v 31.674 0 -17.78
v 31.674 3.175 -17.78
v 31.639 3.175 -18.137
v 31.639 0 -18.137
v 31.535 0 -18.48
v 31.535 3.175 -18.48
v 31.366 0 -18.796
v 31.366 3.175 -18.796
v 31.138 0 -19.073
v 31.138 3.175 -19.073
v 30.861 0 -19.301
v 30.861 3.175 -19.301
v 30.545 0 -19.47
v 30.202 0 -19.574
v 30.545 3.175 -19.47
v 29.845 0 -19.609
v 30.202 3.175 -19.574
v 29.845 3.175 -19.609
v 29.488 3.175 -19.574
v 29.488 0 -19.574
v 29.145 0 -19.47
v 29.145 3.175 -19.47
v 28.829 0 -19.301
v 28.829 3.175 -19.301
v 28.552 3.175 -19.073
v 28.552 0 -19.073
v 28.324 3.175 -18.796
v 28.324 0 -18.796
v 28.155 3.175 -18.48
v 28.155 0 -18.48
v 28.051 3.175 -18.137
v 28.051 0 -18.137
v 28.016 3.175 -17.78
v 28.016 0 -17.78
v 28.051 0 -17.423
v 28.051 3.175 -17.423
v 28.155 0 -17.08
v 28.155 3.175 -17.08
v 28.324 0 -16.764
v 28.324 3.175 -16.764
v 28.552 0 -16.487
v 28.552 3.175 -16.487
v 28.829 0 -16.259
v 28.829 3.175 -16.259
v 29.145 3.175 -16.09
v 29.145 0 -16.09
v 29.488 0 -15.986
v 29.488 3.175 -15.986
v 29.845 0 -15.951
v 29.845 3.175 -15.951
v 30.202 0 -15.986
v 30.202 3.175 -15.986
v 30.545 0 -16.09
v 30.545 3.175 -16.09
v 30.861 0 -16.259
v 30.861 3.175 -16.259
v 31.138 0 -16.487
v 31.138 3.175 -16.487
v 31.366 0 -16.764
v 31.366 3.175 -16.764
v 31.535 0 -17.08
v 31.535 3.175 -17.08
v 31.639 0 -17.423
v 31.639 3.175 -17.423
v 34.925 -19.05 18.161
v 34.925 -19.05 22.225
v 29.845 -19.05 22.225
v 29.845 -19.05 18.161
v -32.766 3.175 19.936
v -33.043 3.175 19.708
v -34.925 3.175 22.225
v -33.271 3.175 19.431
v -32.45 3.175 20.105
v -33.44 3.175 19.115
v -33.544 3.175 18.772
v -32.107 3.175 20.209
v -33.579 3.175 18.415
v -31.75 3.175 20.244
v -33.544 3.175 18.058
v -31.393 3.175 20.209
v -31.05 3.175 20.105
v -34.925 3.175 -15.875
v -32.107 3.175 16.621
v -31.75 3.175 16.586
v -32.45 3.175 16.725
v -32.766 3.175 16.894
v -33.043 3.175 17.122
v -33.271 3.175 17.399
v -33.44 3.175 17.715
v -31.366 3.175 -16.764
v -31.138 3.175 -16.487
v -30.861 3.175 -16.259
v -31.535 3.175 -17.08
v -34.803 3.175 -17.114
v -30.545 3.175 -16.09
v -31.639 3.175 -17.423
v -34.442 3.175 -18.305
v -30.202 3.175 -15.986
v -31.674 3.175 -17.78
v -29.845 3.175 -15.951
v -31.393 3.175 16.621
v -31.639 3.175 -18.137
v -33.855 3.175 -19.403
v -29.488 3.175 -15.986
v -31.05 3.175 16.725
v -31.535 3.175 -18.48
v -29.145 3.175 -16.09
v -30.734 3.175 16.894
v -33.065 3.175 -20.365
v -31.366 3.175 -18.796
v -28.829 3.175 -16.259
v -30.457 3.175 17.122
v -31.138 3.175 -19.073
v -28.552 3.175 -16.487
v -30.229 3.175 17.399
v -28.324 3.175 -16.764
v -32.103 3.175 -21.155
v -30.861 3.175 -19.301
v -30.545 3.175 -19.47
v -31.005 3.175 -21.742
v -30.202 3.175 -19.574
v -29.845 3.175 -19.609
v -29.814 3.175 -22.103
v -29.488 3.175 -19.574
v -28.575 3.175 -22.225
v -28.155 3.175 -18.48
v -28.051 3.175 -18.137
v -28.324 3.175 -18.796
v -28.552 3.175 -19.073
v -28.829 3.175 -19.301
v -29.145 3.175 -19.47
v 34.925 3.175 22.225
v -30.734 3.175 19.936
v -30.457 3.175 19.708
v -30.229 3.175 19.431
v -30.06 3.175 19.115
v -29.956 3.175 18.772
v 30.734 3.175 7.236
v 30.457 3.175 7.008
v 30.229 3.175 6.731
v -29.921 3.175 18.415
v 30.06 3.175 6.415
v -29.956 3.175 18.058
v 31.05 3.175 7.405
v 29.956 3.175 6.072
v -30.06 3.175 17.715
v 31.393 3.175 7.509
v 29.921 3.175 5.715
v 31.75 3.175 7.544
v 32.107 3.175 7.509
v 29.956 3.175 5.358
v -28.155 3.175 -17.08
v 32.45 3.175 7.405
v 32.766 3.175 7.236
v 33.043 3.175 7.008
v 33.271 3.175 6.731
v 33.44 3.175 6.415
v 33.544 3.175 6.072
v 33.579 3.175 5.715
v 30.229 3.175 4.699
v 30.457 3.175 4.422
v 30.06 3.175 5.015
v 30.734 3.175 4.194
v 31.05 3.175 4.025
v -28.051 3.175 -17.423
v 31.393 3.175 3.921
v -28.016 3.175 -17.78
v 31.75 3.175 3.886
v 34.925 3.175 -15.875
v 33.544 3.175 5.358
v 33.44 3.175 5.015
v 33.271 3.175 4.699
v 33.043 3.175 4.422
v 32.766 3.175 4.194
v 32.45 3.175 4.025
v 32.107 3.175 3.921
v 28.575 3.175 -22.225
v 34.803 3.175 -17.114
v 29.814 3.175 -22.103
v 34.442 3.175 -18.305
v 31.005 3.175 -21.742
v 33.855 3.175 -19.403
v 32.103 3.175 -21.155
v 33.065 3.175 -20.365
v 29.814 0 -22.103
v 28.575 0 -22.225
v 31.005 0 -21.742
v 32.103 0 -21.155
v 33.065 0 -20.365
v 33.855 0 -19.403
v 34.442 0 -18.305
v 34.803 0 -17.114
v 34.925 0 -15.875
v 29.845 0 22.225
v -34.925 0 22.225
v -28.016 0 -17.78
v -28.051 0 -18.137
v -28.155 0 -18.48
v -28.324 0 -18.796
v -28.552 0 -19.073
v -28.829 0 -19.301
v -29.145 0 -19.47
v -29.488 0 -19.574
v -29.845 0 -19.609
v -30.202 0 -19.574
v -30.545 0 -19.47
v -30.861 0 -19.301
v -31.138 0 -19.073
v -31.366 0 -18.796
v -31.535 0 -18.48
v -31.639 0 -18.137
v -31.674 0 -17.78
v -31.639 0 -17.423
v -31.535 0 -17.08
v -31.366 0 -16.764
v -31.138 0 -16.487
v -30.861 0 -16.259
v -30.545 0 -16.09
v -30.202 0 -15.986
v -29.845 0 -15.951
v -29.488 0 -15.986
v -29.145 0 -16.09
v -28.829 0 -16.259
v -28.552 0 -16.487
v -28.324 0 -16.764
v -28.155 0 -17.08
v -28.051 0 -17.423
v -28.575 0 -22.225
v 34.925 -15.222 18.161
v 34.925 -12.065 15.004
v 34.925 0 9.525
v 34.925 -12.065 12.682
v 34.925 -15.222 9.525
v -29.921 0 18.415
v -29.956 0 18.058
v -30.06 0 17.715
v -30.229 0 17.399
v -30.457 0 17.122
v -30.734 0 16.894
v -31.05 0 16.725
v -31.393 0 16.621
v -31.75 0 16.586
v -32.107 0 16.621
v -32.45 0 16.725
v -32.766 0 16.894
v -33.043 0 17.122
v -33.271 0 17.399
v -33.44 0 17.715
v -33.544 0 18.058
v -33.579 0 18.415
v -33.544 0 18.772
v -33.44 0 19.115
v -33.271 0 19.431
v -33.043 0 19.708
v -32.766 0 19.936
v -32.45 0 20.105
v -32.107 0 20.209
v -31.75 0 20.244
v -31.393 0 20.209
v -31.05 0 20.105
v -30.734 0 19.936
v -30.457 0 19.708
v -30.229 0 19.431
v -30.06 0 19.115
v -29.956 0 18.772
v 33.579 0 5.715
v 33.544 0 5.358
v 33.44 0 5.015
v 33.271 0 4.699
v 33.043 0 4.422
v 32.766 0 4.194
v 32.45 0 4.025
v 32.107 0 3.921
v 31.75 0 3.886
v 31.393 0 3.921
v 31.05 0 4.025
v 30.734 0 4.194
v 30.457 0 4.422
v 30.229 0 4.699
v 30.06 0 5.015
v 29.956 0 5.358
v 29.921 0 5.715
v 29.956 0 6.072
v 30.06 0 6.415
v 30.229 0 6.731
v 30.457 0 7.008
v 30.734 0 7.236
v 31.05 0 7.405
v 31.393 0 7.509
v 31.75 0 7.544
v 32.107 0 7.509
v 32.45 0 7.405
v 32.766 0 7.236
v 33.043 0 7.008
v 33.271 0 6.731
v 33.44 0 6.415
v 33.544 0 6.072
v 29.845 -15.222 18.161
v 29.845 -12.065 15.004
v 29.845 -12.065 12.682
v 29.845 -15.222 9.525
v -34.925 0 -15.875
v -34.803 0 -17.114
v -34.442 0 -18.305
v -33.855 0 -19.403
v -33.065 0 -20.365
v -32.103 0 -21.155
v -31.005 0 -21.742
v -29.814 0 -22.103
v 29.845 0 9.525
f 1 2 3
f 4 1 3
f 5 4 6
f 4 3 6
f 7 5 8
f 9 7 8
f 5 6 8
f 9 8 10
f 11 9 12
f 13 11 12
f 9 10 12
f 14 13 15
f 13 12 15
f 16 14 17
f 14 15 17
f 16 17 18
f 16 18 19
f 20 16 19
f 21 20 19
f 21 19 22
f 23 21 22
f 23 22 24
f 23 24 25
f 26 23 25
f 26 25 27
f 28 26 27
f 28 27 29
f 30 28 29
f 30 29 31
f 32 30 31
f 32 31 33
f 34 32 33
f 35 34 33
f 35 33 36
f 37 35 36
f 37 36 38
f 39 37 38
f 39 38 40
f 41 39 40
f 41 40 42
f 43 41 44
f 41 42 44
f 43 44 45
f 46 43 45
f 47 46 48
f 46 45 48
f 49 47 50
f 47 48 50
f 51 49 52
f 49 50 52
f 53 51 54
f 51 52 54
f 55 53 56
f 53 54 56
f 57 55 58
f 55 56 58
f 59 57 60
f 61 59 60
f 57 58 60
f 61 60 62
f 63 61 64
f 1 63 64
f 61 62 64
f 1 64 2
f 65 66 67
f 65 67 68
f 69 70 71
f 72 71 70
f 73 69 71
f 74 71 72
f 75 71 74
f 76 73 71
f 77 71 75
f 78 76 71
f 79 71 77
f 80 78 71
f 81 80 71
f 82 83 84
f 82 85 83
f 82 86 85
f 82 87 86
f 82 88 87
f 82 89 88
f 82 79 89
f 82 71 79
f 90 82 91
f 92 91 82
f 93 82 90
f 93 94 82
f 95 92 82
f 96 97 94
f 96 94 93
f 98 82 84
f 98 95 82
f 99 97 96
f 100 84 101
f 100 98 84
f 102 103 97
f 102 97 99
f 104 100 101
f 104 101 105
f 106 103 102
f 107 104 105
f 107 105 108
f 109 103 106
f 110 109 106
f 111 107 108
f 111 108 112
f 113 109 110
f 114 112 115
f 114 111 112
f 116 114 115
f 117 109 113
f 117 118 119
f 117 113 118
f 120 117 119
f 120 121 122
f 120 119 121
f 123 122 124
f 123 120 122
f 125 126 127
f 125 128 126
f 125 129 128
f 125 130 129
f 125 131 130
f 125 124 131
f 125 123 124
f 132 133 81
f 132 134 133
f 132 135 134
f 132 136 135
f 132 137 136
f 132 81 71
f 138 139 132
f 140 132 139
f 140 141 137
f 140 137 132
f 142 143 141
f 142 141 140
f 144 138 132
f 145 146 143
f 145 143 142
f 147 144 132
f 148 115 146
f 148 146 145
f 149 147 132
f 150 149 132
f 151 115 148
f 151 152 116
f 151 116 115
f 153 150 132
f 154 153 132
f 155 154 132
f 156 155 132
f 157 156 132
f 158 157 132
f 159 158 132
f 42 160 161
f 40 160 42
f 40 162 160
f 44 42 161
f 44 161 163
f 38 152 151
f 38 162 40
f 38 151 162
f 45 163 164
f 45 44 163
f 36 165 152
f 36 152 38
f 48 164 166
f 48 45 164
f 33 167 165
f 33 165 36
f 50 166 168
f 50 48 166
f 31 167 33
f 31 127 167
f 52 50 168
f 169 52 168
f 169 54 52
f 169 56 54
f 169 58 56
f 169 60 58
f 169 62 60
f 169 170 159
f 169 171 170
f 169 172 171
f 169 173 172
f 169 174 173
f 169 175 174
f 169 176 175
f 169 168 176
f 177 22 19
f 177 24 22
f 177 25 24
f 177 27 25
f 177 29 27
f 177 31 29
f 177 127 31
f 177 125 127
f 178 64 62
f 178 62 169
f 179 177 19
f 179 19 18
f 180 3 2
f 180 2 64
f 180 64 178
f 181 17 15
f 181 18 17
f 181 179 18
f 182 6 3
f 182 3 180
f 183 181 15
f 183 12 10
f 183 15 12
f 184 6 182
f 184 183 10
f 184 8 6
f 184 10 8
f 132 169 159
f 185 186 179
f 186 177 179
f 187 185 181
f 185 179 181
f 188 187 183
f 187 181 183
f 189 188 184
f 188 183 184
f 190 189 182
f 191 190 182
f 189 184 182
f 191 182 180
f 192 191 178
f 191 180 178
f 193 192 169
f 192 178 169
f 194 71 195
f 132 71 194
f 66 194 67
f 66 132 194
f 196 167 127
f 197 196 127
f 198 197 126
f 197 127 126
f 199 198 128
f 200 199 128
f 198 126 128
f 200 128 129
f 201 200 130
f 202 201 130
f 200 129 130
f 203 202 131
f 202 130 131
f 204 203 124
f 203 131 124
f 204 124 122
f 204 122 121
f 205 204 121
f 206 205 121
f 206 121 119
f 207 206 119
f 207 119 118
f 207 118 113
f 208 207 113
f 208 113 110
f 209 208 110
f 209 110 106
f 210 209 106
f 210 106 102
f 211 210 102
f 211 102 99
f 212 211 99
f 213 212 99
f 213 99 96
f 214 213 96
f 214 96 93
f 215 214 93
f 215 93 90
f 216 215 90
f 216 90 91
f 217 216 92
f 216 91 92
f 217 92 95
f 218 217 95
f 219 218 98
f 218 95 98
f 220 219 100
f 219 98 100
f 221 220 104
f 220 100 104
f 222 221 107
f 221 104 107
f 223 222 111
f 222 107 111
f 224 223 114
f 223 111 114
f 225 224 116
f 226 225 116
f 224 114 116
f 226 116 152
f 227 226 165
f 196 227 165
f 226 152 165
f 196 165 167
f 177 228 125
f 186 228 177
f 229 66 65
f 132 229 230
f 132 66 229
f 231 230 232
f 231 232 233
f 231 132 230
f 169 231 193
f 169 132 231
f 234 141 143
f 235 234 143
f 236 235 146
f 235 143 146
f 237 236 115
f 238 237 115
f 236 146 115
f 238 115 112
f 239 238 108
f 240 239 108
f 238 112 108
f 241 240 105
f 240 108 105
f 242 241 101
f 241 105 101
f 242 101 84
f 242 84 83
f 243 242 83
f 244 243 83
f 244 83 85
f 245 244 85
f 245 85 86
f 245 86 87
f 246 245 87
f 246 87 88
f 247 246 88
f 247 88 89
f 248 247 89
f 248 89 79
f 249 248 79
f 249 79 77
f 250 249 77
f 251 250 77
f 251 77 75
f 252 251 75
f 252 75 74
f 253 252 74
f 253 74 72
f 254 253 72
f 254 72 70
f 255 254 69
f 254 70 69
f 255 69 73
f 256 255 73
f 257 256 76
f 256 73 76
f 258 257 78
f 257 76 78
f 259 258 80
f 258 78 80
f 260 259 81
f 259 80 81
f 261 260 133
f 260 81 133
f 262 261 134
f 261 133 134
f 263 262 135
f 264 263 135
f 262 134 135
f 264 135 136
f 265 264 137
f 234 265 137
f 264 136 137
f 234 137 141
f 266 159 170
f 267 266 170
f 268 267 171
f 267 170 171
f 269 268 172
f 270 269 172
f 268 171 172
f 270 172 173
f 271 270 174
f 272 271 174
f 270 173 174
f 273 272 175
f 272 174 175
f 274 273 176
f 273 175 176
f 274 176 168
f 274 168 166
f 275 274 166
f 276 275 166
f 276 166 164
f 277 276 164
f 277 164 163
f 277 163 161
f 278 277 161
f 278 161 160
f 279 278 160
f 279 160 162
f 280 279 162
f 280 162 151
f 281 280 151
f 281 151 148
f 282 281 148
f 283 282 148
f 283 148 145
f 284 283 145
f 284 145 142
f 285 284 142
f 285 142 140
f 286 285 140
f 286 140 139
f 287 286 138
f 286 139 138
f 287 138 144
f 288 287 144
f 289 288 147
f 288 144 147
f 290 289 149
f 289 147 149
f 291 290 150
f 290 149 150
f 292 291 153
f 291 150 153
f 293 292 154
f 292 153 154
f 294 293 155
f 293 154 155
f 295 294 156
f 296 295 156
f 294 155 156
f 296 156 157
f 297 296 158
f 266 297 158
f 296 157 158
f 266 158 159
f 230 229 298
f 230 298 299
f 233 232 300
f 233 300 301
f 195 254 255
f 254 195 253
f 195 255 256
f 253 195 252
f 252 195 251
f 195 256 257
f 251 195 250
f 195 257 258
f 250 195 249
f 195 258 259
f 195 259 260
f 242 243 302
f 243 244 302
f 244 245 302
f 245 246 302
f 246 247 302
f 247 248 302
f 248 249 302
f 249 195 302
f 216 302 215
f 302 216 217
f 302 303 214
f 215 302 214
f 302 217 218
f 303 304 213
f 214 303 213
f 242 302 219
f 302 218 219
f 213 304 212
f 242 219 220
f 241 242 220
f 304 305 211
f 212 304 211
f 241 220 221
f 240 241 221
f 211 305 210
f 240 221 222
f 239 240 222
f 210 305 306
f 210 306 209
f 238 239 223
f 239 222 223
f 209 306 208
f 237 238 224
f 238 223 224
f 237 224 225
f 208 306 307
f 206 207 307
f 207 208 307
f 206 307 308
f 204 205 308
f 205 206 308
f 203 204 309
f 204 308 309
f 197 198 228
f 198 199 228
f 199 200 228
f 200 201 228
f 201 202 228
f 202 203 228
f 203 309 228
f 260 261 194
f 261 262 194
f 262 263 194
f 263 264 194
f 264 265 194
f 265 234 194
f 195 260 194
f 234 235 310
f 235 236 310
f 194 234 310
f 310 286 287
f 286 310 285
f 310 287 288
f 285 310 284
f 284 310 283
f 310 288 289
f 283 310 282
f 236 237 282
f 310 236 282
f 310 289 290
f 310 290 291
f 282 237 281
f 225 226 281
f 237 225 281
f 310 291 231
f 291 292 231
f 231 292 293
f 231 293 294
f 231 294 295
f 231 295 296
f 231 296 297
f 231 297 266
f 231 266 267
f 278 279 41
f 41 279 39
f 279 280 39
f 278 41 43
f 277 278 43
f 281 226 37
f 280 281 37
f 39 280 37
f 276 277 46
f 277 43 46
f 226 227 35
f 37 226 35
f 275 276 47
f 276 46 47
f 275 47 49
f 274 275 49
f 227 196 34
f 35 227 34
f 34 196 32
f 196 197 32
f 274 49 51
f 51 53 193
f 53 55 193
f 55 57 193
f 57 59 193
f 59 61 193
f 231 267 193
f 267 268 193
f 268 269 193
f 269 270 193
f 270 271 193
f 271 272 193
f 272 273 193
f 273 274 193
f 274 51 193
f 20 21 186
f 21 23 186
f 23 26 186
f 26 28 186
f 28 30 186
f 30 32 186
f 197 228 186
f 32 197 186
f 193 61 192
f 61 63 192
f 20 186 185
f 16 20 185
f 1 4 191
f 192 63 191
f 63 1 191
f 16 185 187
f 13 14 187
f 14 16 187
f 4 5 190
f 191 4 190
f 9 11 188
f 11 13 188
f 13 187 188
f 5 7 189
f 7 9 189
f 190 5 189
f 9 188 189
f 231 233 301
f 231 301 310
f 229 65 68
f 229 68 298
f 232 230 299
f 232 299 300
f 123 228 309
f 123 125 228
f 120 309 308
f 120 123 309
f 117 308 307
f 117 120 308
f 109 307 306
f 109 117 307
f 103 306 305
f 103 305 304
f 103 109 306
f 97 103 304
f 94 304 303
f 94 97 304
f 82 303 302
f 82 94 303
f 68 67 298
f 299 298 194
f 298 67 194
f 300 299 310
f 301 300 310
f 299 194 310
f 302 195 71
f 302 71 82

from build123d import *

# Parameters (mm, degrees)
SKETCH1_W                      = 69.85
SKETCH1_H                      = 44.45
BOSS_EXTRUDE1_DEPTH            = 3.175
BOSS_EXTRUDE2_DEPTH            = 5.08
FILLET1_R                      = 6.35
F_6_0_204_DIAMETER_HOLE1_D     = 3.6576
F_6_0_204_DIAMETER_HOLE1_DEPTH = 38.1
F_6_0_204_DIAMETER_HOLE1_TIP   = 1.0988539


with BuildPart() as part:
    # Sketch1 → Boss-Extrude1 (new body)
    with BuildSketch(Plane(origin=(0, 0, 0), x_dir=(1, 0, 0), z_dir=(0, 1, 0))):
        Rectangle(SKETCH1_W, SKETCH1_H)
    extrude(amount=BOSS_EXTRUDE1_DEPTH)

    # Sketch2 → Boss-Extrude2 (add)
    with BuildSketch(Plane(origin=(34.925, 0, 0), x_dir=(0, 0, -1), z_dir=(1, 0, 0))):
        Polygon((-22.225, 0), (-22.225, -19.05), (-18.161, -19.05), (-18.161, -15.2219533), (-15.0040594, -12.065), (-12.681966, -12.065), (-9.525, -15.2219533), (-9.525, 0), align=None)
    extrude(amount=-BOSS_EXTRUDE2_DEPTH)

    # Fillet1
    fillet1_edges = [part.edges().sort_by_distance(p)[0] for p in [
        (-34.925, 1.5875, -22.225),
        (34.925, 1.5875, -22.225),
    ]]
    fillet(fillet1_edges, radius=FILLET1_R)

    # #6 (0.204) Diameter Hole1
    with Locations(Plane(origin=(0, 0, 0), x_dir=(-1, 0, 0), z_dir=(0, -1, 0))):
        with Locations((-29.845, 17.78), (29.845, 17.78), (31.75, -18.415), (-31.75, -5.715)):
            Hole(F_6_0_204_DIAMETER_HOLE1_D / 2, depth=F_6_0_204_DIAMETER_HOLE1_DEPTH)
            with Locations((0, 0, -(F_6_0_204_DIAMETER_HOLE1_DEPTH + F_6_0_204_DIAMETER_HOLE1_TIP / 2))):  # 118° drill point
                Cone(0, F_6_0_204_DIAMETER_HOLE1_D / 2, F_6_0_204_DIAMETER_HOLE1_TIP, mode=Mode.SUBTRACT)


solid = part.part
